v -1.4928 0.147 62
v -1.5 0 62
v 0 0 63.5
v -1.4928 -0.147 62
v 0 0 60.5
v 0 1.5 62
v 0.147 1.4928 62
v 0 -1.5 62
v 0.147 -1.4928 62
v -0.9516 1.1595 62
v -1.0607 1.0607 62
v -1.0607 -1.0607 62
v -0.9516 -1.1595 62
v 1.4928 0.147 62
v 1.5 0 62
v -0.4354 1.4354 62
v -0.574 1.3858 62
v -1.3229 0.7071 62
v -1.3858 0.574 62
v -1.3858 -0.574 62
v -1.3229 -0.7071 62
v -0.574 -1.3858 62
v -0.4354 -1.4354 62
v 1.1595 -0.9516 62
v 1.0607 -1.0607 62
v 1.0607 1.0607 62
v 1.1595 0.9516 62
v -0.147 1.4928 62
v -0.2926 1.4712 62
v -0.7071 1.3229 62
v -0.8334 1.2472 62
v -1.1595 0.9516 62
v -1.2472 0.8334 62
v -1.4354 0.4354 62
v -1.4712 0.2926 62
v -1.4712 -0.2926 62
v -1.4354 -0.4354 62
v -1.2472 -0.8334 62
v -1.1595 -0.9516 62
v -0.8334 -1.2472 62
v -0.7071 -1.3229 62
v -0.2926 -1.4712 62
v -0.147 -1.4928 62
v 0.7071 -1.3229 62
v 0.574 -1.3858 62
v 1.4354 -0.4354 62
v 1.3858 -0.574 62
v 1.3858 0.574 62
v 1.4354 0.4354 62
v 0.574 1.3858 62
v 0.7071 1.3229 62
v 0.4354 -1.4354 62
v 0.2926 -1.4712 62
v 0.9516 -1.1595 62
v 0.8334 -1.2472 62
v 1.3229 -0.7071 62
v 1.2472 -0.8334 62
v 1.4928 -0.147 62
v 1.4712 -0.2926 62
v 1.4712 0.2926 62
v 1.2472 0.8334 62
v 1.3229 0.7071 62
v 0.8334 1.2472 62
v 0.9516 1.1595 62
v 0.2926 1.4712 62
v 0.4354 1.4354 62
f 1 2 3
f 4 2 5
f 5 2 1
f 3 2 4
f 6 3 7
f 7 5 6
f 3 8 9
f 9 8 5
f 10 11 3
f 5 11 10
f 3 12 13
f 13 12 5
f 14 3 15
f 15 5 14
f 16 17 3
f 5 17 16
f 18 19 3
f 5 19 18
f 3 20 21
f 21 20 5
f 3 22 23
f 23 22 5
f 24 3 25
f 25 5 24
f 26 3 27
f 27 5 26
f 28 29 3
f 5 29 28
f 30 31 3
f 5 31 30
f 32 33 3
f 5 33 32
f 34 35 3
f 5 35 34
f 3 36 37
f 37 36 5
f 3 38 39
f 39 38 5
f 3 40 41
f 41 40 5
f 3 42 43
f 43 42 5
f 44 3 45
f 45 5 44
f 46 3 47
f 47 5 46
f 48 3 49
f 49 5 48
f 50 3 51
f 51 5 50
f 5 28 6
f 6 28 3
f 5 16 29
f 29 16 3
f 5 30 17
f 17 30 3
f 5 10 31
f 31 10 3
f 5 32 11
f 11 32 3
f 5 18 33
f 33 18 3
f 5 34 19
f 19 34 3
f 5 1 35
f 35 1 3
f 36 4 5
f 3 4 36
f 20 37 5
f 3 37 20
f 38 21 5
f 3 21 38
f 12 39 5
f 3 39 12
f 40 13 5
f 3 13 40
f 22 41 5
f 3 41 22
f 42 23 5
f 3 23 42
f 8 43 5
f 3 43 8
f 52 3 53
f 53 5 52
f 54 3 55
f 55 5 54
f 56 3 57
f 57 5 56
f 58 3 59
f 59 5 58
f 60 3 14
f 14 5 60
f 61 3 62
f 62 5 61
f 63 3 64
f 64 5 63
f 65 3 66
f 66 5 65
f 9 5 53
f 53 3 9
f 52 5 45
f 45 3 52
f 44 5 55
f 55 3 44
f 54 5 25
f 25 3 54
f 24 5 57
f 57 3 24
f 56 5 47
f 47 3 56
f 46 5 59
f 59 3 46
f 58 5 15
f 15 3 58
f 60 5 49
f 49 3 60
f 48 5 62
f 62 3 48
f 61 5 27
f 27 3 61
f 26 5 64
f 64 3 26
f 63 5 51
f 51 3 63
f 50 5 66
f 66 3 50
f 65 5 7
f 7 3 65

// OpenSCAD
// Pestle for 1.5 mL microcentrifuge tube - printed standing upright.
// Corrected to ensure single body, correct positioning (z=0), and proper groove cutting.

// Handle
h_d   = 8;      // Handle diameter
h_z1  = 45;     // Handle end Z (top of handle)

// Cone
c_d1  = 8;      // Cone top diameter (matches handle)
c_d2  = 3;      // Cone bottom diameter
c_z1  = 45;     // Cone start Z
c_z2  = 62;     // Cone end Z

// Tip
tip_r = 1.5;    // Tip radius (3 mm diameter)
tip_z = 62;     // Tip center Z

// Grooves
g_n   = 4;      // Number of grooves
g_w   = 2;      // Groove width (Z)
g_d   = 1;      // Groove depth
g_zs  = [10, 15, 20, 25]; // Groove center Z positions

$fn = 64;

// Main body construction using rotate_extrude for a single watertight volume.
// Profile points: [radius, z]
// Start at bottom of handle (z=0, r=4)
// Go up handle (z=45, r=4)
// Taper to cone (z=62, r=1.5)
// Tip is a sphere centered at z=62.
// The profile goes from the cone tip (1.5, 62) to the top of the sphere (0, 63.5)
// and back to the cone tip (1.5, 62).
// Note: The sphere is centered at z=62, so it extends from z=60.5 to z=63.5.
// The cone ends at z=62. The sphere's equator is at z=62.
// The profile must trace the outer surface.
// (4,0) -> (4,45) -> (1.5,62) -> (0,63.5) -> (0,60.5) -> (1.5,62) -> (4,45) -> (4,0).
// This creates a handle, a cone, and a sphere attached at the equator.

difference() {
    // Build the main body
    rotate_extrude($fn = 64) 
        polygon([
            [h_d/2, 0],
            [h_d/2, h_z1],
            [c_d2/2, c_z2],
            [0, c_z2 + tip_r],
            [0, c_z2 - tip_r],
            [c_d2/2, c_z2],
            [h_d/2, h_z1],
            [h_d/2, 0]
        ]);

    // Cut grooves
    // Each groove is a cylinder cut into the handle.
    // We extend the cutting cylinder slightly past the handle boundaries to ensure clean cuts.
    for (i = [0 : g_n - 1]) {
        z_pos = g_zs[i];
        // Groove cylinder: diameter = handle diameter + 2*depth (to cut fully through)
        cut_d = h_d + 2 * g_d;
        
        translate([0, 0, z_pos - g_w / 2]) {
            cylinder(h = g_w + 2, d = cut_d, center = true);
        }
    }
}
